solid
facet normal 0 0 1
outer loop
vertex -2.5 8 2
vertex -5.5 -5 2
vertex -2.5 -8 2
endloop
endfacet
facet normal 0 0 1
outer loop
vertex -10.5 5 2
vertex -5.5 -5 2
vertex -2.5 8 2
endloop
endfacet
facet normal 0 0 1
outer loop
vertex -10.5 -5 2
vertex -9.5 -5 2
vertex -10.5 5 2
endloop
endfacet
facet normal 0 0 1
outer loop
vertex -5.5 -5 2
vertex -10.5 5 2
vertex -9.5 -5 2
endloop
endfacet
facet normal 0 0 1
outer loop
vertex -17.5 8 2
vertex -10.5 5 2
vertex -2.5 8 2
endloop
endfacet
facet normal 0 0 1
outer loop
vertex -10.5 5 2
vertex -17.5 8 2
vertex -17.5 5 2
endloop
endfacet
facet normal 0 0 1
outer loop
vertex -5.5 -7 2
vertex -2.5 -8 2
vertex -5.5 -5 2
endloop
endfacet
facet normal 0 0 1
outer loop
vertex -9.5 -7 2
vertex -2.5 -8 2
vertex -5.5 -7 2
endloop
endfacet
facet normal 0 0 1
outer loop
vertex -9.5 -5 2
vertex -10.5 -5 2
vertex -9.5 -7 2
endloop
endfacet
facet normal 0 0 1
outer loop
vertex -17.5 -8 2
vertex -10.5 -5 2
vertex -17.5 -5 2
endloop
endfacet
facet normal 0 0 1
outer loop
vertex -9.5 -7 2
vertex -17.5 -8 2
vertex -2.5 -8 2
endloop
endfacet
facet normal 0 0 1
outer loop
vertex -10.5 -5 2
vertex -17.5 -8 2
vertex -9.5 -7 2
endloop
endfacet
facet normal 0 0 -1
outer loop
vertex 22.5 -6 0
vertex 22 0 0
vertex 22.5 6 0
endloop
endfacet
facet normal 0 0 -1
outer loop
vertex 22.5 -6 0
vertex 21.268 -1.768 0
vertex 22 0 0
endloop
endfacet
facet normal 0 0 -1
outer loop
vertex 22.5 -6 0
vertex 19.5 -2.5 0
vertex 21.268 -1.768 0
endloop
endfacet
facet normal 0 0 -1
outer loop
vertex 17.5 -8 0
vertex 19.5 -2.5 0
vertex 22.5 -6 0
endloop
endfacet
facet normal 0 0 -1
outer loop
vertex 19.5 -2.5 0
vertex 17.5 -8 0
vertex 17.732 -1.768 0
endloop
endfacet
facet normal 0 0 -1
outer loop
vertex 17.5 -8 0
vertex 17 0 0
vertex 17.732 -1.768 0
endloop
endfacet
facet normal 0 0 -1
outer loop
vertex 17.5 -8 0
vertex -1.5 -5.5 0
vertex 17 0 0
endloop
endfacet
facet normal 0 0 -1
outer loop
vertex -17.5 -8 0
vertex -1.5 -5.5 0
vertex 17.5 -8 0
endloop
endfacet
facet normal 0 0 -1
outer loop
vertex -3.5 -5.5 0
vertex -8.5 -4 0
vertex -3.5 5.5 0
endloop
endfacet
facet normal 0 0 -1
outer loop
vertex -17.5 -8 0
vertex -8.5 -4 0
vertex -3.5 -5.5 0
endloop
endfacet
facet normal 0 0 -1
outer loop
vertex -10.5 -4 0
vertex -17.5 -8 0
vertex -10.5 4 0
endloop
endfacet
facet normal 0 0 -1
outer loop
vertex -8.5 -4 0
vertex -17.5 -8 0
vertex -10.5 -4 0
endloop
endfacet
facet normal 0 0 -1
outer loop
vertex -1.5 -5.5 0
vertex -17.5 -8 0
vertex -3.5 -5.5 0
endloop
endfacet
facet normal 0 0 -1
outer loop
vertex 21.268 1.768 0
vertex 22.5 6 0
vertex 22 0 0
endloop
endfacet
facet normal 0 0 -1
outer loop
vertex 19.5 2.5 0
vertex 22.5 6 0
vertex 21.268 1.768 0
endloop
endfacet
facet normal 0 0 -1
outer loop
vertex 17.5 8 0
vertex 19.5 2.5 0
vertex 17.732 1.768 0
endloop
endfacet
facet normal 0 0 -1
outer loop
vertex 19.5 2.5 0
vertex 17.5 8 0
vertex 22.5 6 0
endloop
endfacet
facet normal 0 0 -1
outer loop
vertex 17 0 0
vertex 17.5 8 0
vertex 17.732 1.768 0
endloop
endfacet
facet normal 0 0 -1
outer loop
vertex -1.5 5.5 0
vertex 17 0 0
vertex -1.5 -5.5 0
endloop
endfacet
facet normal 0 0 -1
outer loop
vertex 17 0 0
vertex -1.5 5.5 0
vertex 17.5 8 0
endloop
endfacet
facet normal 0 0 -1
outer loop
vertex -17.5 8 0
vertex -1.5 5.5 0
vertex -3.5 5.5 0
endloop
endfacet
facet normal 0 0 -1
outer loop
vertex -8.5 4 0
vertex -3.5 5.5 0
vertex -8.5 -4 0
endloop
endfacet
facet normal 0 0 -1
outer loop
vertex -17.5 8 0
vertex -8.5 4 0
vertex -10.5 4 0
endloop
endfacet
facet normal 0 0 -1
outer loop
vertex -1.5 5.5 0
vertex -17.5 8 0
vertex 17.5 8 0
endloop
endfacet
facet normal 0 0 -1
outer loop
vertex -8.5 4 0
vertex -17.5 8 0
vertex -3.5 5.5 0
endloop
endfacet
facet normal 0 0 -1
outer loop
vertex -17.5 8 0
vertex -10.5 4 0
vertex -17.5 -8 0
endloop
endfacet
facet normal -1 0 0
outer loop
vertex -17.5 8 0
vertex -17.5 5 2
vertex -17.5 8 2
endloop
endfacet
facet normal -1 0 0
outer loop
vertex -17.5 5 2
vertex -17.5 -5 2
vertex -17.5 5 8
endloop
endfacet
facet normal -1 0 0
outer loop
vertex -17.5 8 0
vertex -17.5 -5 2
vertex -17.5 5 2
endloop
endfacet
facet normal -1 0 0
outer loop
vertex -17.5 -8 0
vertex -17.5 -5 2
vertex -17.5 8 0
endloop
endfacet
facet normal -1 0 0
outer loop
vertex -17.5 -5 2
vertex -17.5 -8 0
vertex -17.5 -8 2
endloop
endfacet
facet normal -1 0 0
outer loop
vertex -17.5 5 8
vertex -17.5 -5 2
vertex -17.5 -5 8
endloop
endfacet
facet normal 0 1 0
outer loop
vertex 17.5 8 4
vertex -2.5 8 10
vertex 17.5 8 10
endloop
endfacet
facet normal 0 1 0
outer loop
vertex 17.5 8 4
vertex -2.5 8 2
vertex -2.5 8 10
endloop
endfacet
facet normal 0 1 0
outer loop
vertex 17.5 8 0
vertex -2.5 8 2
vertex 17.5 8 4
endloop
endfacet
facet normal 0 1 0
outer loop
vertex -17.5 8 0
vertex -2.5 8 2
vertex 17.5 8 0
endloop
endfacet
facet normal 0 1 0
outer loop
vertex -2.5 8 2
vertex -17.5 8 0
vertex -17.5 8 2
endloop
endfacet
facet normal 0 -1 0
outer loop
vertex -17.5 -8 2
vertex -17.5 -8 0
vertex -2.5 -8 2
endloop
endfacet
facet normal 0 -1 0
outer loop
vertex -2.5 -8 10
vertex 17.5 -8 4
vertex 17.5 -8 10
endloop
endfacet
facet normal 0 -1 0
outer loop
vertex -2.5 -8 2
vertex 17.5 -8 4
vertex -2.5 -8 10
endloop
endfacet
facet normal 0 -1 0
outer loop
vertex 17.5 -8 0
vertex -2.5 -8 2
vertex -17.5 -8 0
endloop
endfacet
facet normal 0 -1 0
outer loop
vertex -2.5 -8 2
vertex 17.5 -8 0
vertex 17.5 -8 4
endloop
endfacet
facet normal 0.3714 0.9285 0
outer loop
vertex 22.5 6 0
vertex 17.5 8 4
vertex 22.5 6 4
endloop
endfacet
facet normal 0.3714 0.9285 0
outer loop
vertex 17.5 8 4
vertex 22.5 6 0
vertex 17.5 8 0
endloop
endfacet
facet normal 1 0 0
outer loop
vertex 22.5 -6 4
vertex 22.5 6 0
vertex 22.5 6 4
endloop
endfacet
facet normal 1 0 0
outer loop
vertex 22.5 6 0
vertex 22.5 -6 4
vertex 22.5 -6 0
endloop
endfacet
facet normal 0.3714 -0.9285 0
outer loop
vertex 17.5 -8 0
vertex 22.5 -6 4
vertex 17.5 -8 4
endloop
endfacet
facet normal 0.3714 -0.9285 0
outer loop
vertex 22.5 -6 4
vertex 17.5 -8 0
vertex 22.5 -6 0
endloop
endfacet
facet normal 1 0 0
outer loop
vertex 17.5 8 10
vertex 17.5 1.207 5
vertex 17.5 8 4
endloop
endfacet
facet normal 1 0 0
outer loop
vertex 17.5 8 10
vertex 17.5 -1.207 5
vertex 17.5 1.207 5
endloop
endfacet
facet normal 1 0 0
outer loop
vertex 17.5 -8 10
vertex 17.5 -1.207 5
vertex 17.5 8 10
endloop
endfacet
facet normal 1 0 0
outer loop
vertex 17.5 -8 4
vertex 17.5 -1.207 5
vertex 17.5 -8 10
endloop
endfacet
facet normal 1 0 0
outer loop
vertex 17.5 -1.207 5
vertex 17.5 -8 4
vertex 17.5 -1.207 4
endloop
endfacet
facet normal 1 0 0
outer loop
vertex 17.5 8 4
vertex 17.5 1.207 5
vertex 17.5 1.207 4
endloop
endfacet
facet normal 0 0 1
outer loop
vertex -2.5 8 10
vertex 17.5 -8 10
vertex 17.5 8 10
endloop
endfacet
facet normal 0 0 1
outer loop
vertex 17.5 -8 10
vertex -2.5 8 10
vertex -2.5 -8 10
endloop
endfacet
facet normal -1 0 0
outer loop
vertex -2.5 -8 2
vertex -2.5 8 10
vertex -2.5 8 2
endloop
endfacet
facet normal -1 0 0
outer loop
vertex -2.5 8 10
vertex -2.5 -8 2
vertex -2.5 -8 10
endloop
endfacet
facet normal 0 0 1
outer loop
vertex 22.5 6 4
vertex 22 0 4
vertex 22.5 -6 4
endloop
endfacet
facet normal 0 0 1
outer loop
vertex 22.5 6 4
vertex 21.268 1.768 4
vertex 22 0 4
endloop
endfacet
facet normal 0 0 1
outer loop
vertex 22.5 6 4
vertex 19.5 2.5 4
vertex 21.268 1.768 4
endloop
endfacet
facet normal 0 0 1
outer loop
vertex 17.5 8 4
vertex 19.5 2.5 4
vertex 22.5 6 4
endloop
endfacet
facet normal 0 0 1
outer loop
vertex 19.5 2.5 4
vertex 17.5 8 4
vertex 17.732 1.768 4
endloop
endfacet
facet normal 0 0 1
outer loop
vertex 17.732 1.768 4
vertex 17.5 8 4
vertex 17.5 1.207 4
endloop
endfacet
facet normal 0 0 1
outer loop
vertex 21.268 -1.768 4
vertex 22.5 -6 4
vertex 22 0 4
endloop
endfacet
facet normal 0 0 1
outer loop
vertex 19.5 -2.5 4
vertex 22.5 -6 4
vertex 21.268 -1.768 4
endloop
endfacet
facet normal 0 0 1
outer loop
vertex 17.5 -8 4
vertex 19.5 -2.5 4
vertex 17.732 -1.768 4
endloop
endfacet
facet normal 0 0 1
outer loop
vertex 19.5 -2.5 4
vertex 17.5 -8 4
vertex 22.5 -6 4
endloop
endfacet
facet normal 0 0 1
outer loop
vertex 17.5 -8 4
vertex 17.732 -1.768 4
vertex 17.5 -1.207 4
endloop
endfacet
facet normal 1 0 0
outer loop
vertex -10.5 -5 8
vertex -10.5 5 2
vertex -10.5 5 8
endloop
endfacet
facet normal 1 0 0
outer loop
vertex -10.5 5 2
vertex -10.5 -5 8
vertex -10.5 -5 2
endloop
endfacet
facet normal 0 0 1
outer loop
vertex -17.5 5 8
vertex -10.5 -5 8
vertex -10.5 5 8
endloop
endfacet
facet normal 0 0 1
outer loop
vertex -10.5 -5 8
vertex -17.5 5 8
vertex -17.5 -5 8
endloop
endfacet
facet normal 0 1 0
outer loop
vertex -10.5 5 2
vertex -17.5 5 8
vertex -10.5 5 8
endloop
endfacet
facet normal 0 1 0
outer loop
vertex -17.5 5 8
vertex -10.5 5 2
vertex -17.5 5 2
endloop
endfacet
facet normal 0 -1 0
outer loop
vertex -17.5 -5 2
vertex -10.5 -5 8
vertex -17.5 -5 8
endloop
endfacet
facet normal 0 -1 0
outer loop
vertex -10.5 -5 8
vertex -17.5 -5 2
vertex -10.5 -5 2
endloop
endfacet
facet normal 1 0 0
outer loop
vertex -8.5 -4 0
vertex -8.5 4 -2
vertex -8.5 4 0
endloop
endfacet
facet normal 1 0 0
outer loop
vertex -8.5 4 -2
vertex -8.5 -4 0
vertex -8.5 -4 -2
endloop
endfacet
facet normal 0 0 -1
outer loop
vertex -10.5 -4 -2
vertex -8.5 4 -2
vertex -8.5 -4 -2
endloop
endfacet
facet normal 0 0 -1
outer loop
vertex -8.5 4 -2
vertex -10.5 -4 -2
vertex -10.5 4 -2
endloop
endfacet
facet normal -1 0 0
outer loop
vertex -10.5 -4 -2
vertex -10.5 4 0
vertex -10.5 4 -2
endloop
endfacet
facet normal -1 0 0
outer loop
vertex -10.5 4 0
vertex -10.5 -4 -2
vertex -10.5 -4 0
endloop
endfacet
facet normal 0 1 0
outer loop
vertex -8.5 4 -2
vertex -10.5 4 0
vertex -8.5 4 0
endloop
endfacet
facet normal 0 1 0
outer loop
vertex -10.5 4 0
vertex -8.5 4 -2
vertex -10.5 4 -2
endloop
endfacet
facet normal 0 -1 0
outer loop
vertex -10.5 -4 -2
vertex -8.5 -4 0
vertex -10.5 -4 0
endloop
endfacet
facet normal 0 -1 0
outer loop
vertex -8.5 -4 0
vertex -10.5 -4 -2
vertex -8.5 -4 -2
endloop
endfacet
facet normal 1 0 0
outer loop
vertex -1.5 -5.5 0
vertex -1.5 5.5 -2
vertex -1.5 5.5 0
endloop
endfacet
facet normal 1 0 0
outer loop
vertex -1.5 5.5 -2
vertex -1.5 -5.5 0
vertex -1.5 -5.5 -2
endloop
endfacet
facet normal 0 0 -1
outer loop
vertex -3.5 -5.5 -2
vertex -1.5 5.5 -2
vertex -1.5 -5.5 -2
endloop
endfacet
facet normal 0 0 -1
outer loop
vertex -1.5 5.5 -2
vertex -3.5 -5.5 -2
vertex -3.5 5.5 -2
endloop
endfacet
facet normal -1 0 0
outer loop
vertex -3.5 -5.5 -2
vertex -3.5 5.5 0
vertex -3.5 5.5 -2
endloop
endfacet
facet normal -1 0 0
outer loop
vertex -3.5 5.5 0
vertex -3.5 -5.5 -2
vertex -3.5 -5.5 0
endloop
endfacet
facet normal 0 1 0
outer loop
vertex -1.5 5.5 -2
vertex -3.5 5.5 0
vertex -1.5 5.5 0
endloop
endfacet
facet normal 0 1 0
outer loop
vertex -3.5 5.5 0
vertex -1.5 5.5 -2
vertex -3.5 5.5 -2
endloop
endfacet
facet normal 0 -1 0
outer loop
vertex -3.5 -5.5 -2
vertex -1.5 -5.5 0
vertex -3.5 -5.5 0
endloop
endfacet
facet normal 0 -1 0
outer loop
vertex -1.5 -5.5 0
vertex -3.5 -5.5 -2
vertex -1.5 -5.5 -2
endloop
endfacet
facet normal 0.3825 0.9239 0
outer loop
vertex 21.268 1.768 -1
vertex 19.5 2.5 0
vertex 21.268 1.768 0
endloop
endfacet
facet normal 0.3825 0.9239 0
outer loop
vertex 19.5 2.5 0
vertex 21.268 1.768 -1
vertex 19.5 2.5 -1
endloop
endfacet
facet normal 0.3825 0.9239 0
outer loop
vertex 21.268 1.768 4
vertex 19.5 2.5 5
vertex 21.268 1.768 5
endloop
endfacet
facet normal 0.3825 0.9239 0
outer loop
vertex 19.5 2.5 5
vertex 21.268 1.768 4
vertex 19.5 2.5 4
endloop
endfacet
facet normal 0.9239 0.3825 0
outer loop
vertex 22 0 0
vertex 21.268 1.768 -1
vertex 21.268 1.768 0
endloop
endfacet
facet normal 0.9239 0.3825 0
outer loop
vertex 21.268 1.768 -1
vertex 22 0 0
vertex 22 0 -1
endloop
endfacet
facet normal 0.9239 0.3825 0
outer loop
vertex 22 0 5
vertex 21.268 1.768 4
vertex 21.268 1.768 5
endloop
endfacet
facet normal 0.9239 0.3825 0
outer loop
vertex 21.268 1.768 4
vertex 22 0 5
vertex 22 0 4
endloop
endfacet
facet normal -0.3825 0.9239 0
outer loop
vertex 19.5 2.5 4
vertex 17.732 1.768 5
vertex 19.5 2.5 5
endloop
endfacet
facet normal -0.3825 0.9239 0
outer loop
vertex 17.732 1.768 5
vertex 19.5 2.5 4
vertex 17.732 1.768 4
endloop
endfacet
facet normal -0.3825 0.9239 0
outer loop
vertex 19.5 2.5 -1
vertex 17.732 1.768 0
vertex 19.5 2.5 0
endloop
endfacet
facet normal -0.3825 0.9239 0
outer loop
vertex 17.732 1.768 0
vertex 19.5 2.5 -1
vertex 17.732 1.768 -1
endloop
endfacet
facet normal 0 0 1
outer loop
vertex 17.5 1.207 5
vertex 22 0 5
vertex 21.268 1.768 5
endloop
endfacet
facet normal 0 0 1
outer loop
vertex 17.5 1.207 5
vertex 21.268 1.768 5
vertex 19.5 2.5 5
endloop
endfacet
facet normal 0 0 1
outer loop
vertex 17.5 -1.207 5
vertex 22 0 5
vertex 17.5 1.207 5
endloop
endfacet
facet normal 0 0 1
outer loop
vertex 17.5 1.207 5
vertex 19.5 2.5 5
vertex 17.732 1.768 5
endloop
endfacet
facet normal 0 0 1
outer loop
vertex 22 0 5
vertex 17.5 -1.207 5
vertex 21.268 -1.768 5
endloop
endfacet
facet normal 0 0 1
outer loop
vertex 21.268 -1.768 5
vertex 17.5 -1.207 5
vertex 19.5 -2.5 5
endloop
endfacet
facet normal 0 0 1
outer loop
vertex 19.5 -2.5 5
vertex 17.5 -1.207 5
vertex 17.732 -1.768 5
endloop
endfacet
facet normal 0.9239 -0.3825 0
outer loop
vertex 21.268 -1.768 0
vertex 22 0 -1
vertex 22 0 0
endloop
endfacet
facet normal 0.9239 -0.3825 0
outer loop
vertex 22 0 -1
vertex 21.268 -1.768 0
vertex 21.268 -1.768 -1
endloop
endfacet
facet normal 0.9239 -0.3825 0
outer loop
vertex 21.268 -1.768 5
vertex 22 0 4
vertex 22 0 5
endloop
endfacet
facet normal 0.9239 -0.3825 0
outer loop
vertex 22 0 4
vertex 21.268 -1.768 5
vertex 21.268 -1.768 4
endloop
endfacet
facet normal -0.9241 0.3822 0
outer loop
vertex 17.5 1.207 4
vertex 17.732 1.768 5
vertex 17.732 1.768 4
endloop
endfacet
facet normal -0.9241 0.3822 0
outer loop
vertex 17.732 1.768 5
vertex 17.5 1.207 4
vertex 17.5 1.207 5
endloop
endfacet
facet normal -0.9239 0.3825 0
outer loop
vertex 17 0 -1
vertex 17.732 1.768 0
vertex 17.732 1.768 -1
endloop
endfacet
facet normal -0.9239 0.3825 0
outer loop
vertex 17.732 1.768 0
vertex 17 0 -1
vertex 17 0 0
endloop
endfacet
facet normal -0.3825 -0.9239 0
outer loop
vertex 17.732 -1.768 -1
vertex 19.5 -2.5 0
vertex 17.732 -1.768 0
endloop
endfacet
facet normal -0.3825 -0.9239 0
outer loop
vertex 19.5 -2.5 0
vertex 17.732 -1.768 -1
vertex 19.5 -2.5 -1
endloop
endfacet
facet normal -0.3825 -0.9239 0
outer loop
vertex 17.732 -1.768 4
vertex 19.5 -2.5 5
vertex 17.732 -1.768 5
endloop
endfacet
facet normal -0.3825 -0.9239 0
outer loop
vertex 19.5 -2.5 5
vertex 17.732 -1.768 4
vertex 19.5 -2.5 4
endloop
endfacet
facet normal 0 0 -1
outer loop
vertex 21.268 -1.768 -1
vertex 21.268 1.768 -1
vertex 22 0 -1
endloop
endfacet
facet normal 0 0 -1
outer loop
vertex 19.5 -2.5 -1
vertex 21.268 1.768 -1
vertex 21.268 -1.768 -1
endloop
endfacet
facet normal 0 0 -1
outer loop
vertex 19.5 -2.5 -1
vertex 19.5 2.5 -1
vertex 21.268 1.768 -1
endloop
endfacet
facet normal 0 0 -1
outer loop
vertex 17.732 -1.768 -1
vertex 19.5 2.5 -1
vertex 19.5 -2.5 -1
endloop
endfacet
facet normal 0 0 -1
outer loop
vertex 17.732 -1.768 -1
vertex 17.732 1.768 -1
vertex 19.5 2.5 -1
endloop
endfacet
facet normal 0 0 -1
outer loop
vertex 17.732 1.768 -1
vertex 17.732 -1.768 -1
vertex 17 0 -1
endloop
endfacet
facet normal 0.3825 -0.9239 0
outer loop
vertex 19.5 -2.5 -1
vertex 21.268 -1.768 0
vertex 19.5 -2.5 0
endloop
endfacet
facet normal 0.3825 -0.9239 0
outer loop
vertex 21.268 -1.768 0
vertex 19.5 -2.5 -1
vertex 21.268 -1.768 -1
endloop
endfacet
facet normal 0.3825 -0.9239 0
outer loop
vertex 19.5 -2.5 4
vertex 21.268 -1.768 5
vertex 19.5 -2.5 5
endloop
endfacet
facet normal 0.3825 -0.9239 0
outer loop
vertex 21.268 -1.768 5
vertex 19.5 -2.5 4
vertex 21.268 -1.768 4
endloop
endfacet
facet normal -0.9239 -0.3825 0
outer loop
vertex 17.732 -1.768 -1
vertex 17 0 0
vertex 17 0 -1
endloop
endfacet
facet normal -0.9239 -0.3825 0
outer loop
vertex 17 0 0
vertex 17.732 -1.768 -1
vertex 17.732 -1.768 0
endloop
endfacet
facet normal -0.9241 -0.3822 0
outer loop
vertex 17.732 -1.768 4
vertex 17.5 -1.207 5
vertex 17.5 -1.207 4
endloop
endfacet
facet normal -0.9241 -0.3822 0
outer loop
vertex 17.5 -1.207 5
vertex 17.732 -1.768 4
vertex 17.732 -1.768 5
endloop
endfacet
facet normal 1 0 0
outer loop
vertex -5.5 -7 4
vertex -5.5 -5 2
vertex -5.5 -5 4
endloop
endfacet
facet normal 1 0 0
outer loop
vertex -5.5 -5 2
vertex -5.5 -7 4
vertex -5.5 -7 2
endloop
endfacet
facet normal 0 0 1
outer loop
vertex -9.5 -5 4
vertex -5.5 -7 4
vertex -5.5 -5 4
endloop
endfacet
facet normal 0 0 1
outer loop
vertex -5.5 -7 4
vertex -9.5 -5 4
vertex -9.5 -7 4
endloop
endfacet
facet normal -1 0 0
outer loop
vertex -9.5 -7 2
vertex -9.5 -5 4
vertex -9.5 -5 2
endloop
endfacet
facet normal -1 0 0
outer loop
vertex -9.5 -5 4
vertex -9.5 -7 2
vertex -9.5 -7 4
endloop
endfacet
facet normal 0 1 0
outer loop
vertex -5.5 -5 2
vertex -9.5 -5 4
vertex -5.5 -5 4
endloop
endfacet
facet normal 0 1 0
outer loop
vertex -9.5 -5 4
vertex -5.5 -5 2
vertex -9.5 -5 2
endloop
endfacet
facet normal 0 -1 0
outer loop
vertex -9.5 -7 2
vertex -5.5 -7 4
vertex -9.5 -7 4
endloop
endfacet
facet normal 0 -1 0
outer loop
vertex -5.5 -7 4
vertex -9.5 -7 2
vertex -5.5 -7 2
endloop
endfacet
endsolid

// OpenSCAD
// Temperature and Humidity sensor

module DHT22()
{
    color("darkgreen") union()
    {
        translate([-35/2,-16/2,0])
            cube([35,16,2]);
        translate([35/2,0,0])
            linear_extrude(height=2)
                polygon(points=[[0,-8],[0,8],[5,6],[5,-6]]);
    }
    color("white") union()
    {
        translate([-35/2+15,-16/2,2])
            cube([20,16,10-2]);
        translate([35/2,0,2])
            linear_extrude(height=2)
                polygon(points=[[0,-8],[0,8],[5,6],[5,-6]]);
        translate([-35/2,-10/2,2])
            cube([7,10,8-2]);
    }
    color("gray") union()
    {
        translate([-35/2+7,-8/2,-2])
            cube([2,8,2]);
        translate([-35/2+14,-11/2,-2])
            cube([2,11,2]);
        translate([35/2+2,0,-1])
            cylinder(d=5,h=6,$fn=8);
    }
    color("red") union()
    {
        translate([-35/2+10,-16/2+2/2+1,2/2+2])
            cube([4,2,2],center=true);
    }
}

DHT22();
